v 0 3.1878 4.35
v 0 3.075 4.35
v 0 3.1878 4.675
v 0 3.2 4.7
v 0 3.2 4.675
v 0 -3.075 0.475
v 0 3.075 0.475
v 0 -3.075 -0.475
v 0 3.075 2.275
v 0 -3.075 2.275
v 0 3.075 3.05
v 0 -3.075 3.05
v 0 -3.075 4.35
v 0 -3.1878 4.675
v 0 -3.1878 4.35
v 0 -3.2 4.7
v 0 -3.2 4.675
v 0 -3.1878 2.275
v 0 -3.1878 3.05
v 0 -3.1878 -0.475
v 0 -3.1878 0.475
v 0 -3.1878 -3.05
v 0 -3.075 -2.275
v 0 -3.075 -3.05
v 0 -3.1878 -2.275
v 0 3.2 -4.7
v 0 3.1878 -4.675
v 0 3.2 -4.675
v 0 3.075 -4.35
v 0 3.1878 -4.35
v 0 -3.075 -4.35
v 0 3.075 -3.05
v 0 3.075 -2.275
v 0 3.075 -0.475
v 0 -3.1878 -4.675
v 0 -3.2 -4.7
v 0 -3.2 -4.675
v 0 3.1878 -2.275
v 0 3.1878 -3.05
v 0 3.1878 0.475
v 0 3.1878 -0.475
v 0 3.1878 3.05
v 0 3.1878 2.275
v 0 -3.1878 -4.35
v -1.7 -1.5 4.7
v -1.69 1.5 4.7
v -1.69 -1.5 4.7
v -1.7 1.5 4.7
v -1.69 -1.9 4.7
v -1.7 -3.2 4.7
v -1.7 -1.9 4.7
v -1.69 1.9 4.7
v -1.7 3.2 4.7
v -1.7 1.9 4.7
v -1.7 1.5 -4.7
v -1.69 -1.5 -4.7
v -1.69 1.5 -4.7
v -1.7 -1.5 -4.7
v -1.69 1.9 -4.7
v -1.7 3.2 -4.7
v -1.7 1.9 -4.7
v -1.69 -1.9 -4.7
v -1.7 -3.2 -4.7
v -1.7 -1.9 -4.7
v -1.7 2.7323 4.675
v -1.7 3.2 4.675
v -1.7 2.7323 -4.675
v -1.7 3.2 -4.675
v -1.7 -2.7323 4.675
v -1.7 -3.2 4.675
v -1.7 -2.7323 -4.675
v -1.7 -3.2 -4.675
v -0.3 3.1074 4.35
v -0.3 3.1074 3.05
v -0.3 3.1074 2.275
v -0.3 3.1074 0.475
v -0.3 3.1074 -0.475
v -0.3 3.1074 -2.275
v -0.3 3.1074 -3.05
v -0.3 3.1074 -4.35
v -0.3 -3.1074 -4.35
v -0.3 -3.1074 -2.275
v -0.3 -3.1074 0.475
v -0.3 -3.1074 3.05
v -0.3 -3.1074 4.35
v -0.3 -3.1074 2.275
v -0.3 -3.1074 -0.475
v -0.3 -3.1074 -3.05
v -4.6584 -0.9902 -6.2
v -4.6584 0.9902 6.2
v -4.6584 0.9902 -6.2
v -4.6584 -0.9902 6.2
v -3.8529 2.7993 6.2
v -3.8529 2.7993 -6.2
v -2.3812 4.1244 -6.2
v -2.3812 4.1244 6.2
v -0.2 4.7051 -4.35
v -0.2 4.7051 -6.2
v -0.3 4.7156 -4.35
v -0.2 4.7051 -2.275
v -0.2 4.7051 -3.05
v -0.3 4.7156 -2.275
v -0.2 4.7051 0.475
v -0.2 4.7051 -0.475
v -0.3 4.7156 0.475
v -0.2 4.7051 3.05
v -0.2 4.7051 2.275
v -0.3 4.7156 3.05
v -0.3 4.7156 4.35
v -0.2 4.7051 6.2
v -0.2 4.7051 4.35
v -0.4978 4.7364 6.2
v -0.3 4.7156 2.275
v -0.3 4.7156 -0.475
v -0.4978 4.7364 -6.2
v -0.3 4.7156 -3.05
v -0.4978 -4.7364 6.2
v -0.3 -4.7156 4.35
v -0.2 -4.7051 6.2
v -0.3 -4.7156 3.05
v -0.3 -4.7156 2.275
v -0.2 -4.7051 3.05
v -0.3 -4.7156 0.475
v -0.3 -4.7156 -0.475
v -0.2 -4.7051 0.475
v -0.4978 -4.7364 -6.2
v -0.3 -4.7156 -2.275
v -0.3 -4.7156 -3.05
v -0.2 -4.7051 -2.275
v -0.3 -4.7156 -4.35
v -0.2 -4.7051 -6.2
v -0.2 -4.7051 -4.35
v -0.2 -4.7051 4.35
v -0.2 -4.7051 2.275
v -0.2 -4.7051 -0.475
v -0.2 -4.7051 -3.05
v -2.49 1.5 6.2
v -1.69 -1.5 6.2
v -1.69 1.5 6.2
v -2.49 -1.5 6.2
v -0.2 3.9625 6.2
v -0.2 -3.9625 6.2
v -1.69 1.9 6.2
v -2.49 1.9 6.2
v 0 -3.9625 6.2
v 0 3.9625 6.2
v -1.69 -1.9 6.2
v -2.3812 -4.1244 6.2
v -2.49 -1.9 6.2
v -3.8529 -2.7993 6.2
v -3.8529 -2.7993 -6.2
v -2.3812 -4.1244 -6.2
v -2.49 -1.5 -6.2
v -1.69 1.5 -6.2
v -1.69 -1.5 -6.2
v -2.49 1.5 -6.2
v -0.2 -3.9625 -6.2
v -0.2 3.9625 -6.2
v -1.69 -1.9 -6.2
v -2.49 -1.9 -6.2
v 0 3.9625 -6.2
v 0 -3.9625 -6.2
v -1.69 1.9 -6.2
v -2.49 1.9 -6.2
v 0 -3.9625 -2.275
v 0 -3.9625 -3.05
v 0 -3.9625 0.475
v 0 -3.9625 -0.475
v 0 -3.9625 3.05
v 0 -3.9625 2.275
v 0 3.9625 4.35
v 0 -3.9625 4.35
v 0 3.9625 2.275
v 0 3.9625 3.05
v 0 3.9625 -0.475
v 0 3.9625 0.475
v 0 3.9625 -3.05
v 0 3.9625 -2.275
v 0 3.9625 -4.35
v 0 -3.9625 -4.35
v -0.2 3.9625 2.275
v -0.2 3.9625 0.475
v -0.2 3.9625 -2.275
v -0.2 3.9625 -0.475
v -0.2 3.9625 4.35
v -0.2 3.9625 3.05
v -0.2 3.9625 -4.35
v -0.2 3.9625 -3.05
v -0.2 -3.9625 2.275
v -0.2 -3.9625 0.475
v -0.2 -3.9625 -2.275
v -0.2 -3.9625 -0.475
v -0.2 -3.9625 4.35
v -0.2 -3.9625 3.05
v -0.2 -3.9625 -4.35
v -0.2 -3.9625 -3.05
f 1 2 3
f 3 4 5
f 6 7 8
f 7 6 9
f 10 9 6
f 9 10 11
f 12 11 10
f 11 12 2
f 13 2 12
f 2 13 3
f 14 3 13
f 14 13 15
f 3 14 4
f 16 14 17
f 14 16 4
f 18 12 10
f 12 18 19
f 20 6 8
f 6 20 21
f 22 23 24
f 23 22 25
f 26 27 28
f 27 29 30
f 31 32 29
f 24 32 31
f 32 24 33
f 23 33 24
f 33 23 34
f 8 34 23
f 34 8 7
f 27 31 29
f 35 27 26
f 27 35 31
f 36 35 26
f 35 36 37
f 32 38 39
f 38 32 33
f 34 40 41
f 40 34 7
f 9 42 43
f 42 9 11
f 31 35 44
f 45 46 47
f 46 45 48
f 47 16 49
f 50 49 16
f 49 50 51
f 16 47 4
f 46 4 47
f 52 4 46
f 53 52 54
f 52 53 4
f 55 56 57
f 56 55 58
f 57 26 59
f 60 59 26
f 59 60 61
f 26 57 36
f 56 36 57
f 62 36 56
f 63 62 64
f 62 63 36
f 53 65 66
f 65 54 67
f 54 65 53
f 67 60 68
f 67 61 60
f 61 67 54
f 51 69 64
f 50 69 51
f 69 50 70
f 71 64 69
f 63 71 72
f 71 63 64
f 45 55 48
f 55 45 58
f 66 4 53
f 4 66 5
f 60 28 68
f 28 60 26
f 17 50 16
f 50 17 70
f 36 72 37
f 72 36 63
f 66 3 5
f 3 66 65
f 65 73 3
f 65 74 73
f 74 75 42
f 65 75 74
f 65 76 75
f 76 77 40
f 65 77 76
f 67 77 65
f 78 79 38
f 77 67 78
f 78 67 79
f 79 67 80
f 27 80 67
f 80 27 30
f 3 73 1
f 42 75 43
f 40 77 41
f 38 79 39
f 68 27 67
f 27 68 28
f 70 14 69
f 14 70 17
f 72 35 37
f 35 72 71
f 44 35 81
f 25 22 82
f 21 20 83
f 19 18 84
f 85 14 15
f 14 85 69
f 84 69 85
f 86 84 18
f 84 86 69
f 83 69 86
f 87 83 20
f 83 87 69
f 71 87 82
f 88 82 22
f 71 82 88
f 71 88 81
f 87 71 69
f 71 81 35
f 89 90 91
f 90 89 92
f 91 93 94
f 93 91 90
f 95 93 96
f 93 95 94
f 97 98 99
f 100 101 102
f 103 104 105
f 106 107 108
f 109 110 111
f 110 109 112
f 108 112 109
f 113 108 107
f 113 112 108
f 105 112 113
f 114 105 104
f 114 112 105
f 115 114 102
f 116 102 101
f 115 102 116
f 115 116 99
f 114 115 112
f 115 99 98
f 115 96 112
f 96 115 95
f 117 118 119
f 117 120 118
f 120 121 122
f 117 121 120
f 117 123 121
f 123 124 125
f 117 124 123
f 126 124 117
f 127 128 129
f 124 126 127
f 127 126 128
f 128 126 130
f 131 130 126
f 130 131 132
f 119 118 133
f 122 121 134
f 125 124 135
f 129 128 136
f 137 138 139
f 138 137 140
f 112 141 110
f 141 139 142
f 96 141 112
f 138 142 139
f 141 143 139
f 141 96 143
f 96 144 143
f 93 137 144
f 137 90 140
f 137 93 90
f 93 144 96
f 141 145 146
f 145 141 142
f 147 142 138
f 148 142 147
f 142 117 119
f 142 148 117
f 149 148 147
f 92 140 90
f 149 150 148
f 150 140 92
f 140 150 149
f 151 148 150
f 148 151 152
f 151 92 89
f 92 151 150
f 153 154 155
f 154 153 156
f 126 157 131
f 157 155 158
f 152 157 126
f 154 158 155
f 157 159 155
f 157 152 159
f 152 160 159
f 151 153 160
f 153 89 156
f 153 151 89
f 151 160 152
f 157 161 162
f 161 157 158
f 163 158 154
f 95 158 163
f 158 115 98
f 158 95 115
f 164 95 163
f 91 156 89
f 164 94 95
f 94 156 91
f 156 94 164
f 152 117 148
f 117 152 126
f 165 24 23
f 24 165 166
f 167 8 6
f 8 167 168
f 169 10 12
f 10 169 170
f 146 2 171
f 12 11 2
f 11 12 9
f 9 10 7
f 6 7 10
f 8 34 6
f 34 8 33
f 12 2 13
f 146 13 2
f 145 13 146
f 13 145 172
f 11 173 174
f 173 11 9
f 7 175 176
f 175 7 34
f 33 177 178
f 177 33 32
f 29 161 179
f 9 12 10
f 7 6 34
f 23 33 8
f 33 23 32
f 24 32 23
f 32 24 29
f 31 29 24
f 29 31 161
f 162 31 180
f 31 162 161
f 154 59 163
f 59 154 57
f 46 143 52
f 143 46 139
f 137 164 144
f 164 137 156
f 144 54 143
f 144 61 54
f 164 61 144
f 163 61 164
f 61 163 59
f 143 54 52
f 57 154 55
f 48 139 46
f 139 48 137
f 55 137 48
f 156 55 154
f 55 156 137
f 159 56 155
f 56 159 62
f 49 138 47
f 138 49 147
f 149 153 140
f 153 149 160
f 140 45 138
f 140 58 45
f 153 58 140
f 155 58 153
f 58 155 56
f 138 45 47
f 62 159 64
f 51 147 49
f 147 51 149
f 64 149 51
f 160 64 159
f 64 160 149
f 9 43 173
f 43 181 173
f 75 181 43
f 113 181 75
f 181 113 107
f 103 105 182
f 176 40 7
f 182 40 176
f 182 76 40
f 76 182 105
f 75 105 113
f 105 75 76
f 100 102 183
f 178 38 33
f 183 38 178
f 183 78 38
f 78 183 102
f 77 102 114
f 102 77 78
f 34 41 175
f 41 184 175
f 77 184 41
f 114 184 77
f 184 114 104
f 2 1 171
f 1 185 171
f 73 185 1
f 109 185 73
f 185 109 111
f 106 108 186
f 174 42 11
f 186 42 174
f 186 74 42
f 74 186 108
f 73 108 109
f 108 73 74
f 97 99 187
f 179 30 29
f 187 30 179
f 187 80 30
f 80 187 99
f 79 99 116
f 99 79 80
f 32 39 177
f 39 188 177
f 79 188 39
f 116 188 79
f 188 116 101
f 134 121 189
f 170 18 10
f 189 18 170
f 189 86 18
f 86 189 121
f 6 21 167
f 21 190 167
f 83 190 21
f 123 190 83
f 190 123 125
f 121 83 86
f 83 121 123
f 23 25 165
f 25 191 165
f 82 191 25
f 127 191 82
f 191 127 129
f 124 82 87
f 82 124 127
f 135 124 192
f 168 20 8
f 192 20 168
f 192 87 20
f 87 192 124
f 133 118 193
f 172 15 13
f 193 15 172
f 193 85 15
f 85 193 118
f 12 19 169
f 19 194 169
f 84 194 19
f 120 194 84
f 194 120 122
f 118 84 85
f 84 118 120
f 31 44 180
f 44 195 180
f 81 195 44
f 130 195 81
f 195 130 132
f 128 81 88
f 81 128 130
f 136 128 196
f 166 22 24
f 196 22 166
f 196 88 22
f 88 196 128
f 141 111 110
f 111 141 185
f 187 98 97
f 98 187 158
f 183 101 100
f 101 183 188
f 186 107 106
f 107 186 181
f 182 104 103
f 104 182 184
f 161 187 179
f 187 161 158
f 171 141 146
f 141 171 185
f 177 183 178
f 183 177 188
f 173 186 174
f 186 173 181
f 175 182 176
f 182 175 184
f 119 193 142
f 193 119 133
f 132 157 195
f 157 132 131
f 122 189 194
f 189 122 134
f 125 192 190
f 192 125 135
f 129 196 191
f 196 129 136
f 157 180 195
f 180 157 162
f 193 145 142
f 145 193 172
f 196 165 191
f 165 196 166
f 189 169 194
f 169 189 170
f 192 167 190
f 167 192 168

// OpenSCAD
// dkeeper
// Mark K Malmros 12June2013
// for FireFly project
// revised: 2 top level modules - dkeeper & dkeeper_basic
// uncomment one or the other
// "parameters"

dia = 9.525; // tubing ID = keeper diameter
len = 12.4; // keeper length (nominal 12.35)
w_dip = 6.4; // width of DIP package (nominal 6.34)
l_dip = 9.4; // length of DIP package (nominal 9.34)
d_dip = 3.4; // thickness of DIP package (nominal 3.34)
d_wire = 0.4; // lead wire "diameter" as square holes
pin_dia = 0.50; // diameter of "round" wire transverse pin holes (to dip pins)
d_pin = 0.31; // depth of pin relief ("dip pad")
w_pin = (dia/2 - w_dip/2)*1.08; // lateral width of "dip pad" based on DIP & keeper widths
w_ipin = 1.8; // width of inner pin relief
w_opin = 1.3; // width of end pin relief ("dip pad")

// module library

module half_dip(){  
	difference()
		{	cube(size=[d_dip/2,w_dip,l_dip], center=true);
		// bevel dip cavity 15 degrees from vertical
			translate([0, d_dip,0])rotate(105)cube(size=[d_dip/4,w_dip/2,9.35], center=true);
			mirror([0,1,0])translate([0, d_dip,0])rotate(105)cube(size=[d_dip/4,w_dip/2,9.35], center=true);
		};
				 }

module dip_ipad(){  
		cube(size=[d_pin, w_pin, w_ipin],center=true);  // * 1.05 to oversize for sufficient removal by difference
		}

module dip_opad(){
		cube(size=[d_pin, w_pin , w_opin],center=true);
		}

module pin_relief(){
	translate([-(d_pin/2 -0.01),(dia/2) - w_pin/2 , .475 + (w_ipin/2) ])dip_ipad();
	mirror([0,0,1])translate([-(d_pin/2 -0.01),(dia/2) - w_pin/2 , .475 + (w_ipin/2)])dip_ipad();
	translate([-(d_pin/2 -0.01),(dia/2) - w_pin/2 ,w_pin *2 + w_opin/4])dip_opad();
	mirror([0,0,1])translate([-(d_pin/2 -0.01),(dia/2) - w_pin/2 , w_pin *2 + w_opin/4])dip_opad();
					}
module reliefs(){
	pin_relief();
	mirror([0,1,0])pin_relief();
				}

module pin_trace(){
	translate([0,4.7625,(0.475 + 0.89)])
	rotate(a=[90,90,90]) 
	cylinder(h = 12.7, r= 0.25, center = true);

	translate([0,4.7625,(0.475 + 0.89 + 1.78 + 0.475)])
	rotate(a=[90,90,90]) 
	cylinder(h = 12.7, r=0.25, center = true);
					}

module pin_traces() {
		pin_trace();
		mirror([0,0,1])pin_trace();
					}	
module pins()	{
		pin_traces();
		mirror([0,1,0])pin_traces();
				}	

module lead_traces() {
		translate([-(d_dip/2 + (d_wire *2) -0.01),1.5,-len/2])cube(size=[d_wire *2 ,d_wire,len *1.05]);
		mirror([0,1,0])translate([-(d_dip/2 + (d_wire * 2) - 0.01),1.5,-len/2])cube(size=[d_wire *2 ,d_wire,len *1.05]);
				}


// top level object code

module dkeeper() {

	difference() // pin holes trasverse to dip pins
		{
	difference() // dip pin reliefs
		{
	difference() // lead traces
		{
	difference() // bisected cylinder
		{
			cylinder(h = len, r= dia/2, center = true);
			// bisect cylinder
			translate([(dia/2)/2,0,0])cube(size=[dia/2, dia, len], center=true);
			translate([-(d_dip/2)/2, 0, 0])half_dip(); 
		}
		lead_traces();
		}
		reliefs();
		}
		pins();
		}
			}

// dkeeper();

module dkeeper_basic() {

	difference() // dip pin reliefs
		{
	difference() // lead traces
		{
	difference() // bisected cylinder
		{
			cylinder(h = len, r= dia/2, center = true);
			// bisect cylinder
			translate([(dia/2)/2,0,0])cube(size=[dia/2, dia, len], center=true);
			translate([-(d_dip/2)/2, 0, 0])half_dip(); 
		}
		lead_traces();
		}
		reliefs();
		}
			}

module dkeeper_basic_mod() {
	difference(){
	dkeeper_basic();

	translate([0, dia/2 - d_wire, 0])cube(size=[d_wire,d_wire *2,len *1.05], center = true);
	mirror([0,1,0])translate([0, dia/2 - d_wire, 0])cube(size=[d_wire,d_wire *2,len *1.05], center = true);
}
							}

dkeeper_basic_mod();
// mirror([1,0,0])dkeeper_basic_mod();
